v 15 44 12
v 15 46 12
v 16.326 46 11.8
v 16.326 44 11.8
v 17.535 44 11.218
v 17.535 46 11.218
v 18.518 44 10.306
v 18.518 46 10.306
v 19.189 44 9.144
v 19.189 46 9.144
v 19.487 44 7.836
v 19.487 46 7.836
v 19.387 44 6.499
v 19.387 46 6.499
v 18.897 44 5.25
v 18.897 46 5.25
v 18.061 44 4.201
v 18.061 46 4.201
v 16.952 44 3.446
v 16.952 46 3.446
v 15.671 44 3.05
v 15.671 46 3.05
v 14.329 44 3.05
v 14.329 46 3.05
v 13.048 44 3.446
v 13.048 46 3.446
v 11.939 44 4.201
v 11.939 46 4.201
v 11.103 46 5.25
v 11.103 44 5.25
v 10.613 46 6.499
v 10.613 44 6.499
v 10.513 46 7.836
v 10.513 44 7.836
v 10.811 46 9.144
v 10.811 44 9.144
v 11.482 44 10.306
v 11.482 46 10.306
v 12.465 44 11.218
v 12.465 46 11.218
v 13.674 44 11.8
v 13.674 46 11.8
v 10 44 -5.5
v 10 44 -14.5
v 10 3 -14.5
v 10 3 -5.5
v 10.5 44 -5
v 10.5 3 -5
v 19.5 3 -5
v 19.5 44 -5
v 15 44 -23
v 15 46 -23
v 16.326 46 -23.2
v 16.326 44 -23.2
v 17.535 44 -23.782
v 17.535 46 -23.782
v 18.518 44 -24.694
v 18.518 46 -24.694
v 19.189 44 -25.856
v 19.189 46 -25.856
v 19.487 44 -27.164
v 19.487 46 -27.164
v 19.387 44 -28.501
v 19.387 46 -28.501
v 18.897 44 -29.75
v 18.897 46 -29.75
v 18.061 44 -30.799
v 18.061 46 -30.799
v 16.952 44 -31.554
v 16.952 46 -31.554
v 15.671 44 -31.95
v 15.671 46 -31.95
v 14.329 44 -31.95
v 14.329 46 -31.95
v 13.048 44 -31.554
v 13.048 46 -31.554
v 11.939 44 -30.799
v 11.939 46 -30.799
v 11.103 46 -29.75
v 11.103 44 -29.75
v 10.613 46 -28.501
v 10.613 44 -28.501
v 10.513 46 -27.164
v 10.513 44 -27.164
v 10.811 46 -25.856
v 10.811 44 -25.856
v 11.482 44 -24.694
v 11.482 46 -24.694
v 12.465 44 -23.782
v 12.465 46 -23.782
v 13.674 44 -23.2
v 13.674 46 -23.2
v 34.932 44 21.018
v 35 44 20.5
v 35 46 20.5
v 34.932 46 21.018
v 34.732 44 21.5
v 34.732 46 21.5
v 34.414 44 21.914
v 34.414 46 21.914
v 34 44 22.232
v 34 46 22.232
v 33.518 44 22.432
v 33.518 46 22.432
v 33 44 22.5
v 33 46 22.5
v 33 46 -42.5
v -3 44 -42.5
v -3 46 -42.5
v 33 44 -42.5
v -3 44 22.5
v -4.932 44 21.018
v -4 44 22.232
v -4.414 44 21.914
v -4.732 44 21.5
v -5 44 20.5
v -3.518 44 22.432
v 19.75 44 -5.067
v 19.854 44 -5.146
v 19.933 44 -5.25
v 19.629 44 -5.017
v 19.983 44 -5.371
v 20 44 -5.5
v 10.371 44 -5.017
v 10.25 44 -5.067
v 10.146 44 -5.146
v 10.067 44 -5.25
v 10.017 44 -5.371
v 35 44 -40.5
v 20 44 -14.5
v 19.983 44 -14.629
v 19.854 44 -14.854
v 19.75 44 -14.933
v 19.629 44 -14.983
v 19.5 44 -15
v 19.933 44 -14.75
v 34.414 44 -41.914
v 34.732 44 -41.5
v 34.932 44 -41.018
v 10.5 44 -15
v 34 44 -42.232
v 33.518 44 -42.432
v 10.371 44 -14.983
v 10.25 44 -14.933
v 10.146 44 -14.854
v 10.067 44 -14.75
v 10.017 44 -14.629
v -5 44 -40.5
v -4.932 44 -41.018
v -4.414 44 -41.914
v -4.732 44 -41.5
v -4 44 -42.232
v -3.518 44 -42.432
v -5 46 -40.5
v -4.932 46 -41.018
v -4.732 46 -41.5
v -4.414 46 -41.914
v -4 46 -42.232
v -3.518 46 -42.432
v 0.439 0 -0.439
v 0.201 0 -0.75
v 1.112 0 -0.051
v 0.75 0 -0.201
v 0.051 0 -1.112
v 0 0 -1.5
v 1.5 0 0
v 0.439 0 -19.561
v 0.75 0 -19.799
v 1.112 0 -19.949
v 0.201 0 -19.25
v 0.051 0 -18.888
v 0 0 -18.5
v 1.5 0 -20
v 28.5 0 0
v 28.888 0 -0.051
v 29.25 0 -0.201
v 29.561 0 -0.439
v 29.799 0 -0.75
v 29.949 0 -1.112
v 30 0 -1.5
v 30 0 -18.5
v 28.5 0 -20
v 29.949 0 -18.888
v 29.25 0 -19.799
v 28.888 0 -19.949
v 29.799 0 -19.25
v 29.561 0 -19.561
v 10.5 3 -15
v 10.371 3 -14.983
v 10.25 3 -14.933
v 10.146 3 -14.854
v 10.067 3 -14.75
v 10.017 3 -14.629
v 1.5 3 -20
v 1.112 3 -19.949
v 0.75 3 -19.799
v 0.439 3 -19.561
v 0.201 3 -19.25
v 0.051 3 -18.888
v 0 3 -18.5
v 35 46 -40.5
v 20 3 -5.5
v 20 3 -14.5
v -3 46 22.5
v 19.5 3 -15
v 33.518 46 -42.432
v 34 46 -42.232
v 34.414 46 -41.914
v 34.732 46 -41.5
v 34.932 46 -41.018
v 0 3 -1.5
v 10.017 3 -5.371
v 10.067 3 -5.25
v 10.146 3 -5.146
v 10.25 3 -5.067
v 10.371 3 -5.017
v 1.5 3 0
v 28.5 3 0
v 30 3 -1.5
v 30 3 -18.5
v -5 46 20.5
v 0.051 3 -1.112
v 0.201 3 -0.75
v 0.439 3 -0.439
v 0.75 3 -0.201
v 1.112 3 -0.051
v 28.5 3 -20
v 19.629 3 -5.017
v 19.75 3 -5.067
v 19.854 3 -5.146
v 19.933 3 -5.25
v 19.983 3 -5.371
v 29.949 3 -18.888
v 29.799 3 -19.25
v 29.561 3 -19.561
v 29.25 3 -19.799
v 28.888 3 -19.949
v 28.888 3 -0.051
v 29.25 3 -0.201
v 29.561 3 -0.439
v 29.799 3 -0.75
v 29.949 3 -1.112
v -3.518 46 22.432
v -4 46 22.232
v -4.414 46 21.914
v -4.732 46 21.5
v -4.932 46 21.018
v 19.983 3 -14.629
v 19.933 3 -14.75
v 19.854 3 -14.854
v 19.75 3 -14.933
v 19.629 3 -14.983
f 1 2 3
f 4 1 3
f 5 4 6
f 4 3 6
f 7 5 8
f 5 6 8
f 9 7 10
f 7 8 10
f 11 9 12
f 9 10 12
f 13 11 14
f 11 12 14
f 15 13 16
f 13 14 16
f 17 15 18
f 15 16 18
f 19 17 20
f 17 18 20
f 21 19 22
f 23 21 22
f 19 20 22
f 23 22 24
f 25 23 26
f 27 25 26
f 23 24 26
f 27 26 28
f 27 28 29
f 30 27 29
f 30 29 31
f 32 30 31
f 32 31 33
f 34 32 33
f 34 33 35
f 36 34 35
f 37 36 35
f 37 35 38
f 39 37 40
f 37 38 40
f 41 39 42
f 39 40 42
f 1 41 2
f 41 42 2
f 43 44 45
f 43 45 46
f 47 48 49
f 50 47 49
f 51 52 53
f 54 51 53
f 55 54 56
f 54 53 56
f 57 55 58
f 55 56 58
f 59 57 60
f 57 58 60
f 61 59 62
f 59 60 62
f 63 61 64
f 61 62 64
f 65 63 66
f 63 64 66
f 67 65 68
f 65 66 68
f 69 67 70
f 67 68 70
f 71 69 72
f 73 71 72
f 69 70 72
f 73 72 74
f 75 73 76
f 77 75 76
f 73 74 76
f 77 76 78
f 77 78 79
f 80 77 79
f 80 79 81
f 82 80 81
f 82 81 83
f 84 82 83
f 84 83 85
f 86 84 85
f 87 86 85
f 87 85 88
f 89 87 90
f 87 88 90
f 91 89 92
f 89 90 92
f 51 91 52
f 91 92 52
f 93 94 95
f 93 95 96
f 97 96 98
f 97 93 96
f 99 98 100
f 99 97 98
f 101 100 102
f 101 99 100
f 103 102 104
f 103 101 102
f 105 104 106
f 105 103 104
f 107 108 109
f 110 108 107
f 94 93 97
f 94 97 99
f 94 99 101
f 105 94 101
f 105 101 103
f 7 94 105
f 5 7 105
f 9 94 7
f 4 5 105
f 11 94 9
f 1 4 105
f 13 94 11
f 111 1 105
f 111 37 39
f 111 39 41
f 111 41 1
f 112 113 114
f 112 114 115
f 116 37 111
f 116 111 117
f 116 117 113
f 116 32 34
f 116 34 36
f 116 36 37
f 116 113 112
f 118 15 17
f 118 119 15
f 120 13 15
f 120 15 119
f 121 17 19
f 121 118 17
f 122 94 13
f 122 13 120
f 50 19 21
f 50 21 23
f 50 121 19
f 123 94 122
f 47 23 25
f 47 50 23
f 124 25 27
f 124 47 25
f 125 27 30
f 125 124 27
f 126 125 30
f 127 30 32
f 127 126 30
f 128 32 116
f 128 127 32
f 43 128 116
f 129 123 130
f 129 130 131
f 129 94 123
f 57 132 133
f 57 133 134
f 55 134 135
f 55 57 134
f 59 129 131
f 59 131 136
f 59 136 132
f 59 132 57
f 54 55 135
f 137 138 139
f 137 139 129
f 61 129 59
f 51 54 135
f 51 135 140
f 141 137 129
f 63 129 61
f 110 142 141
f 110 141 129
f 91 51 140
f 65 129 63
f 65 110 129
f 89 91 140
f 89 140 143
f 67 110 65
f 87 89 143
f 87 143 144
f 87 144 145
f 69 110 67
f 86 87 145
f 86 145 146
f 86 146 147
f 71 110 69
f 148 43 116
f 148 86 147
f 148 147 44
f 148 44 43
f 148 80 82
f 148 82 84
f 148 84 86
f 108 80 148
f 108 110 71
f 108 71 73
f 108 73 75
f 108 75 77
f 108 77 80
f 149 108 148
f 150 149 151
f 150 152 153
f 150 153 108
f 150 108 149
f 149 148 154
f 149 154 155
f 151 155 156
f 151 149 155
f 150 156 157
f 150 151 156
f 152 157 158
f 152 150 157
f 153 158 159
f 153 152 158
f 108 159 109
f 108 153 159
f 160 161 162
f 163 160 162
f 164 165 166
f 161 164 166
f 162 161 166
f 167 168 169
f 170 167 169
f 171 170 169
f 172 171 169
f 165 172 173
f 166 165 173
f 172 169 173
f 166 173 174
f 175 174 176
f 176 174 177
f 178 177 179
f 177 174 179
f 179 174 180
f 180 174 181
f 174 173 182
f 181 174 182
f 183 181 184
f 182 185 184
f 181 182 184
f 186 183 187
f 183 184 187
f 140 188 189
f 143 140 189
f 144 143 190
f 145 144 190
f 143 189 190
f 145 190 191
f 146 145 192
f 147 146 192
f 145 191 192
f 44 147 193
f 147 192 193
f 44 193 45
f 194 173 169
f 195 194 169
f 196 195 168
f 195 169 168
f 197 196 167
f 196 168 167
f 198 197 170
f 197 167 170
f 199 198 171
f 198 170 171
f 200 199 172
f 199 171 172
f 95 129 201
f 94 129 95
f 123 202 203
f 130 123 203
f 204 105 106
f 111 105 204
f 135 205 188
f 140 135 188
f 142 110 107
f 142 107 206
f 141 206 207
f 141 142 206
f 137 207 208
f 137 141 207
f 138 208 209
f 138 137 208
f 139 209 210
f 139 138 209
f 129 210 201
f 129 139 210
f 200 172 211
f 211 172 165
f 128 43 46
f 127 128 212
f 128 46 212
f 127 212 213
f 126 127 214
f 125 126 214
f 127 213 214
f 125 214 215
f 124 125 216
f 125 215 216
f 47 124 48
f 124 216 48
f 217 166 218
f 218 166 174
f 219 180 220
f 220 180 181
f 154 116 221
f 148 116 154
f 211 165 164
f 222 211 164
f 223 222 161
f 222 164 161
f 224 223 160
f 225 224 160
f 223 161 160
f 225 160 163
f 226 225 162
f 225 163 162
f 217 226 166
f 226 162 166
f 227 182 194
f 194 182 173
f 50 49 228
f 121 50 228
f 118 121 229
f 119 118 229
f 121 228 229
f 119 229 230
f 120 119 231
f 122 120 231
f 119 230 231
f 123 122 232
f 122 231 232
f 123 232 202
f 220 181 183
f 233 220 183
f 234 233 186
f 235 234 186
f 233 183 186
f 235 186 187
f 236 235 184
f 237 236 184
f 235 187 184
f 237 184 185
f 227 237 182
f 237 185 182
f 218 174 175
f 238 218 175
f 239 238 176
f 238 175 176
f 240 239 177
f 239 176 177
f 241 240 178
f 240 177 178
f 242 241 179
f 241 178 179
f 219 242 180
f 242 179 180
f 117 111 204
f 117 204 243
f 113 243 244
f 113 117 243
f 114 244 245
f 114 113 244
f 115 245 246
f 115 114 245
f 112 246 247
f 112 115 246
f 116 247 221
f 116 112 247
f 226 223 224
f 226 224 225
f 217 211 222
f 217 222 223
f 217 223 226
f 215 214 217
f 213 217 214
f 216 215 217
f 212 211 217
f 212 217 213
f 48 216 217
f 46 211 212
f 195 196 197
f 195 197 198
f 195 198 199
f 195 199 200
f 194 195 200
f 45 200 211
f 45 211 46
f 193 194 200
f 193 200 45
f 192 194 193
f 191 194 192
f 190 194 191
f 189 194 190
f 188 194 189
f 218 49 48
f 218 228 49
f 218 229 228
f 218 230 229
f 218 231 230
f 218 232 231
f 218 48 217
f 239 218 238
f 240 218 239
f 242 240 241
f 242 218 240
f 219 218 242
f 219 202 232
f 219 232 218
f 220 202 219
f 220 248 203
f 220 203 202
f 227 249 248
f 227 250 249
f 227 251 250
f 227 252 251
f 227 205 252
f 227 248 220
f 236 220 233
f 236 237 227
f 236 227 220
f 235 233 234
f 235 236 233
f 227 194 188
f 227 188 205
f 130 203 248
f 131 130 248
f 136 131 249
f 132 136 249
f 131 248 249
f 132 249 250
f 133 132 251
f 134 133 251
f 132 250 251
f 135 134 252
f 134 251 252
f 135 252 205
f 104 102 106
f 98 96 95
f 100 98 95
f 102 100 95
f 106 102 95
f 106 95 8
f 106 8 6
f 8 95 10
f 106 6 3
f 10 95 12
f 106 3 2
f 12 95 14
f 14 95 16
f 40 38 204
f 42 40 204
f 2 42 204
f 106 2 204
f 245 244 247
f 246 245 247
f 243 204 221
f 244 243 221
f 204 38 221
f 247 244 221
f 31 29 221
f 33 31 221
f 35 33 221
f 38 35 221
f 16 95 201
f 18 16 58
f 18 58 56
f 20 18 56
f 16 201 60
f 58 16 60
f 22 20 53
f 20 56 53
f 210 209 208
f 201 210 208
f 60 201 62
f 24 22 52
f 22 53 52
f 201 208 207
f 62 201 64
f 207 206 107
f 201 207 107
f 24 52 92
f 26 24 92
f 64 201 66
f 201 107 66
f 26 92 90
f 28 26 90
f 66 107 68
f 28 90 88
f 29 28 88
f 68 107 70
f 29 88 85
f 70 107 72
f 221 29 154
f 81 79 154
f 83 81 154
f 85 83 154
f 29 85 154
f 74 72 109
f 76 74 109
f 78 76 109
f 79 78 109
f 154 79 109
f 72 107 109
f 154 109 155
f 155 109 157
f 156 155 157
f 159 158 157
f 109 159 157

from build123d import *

# Parameters (mm, degrees)
BOSS_EXTRUDE1_DEPTH = 3
BOSS_EXTRUDE2_DEPTH = 41
BOSS_EXTRUDE3_DEPTH = 2
SKETCH5_R           = 4.5
CUT_EXTRUDE1_DEPTH  = 2


with BuildPart() as part:
    # Sketch1 → Boss-Extrude1 (new body)
    with BuildSketch(Plane(origin=(0, 0, 0), x_dir=(1, 0, 0), z_dir=(0, 1, 0))):
        with BuildLine():
            Line((1.5, 0), (28.5, 0))
            ThreePointArc((28.5, 0), (29.560660172, 0.439339828), (30, 1.5))
            Line((30, 1.5), (30, 18.5))
            ThreePointArc((30, 18.5), (29.560660172, 19.560660172), (28.5, 20))
            Line((28.5, 20), (1.5, 20))
            ThreePointArc((1.5, 20), (0.439339828, 19.560660172), (0, 18.5))
            Line((0, 18.5), (0, 1.5))
            ThreePointArc((0, 1.5), (0.439339828, 0.439339828), (1.5, 0))
        make_face()
    extrude(amount=BOSS_EXTRUDE1_DEPTH)

    # Sketch3 → Boss-Extrude2 (add)
    with BuildSketch(Plane(origin=(0, 3, 0), x_dir=(1, 0, 0), z_dir=(0, 1, 0))):
        with BuildLine():
            Line((10.5, 5), (19.5, 5))
            ThreePointArc((19.5, 5), (19.853553391, 5.146446609), (20, 5.5))
            Line((20, 5.5), (20, 14.5))
            ThreePointArc((20, 14.5), (19.853553391, 14.853553391), (19.5, 15))
            Line((19.5, 15), (10.5, 15))
            ThreePointArc((10.5, 15), (10.146446609, 14.853553391), (10, 14.5))
            Line((10, 14.5), (10, 5.5))
            ThreePointArc((10, 5.5), (10.146446609, 5.146446609), (10.5, 5))
        make_face()
    extrude(amount=BOSS_EXTRUDE2_DEPTH)

    # Sketch4 → Boss-Extrude3 (add)
    with BuildSketch(Plane(origin=(0, 44, 0), x_dir=(1, 0, 0), z_dir=(0, 1, 0))):
        with BuildLine():
            Line((33, -22.5), (-3, -22.5))
            ThreePointArc((-3, -22.5), (-4.414213562, -21.914213562), (-5, -20.5))
            Line((-5, -20.5), (-5, 40.5))
            ThreePointArc((-5, 40.5), (-4.414213562, 41.914213562), (-3, 42.5))
            Line((-3, 42.5), (33, 42.5))
            ThreePointArc((33, 42.5), (34.414213562, 41.914213562), (35, 40.5))
            Line((35, 40.5), (35, -20.5))
            ThreePointArc((35, -20.5), (34.414213562, -21.914213562), (33, -22.5))
        make_face()
    extrude(amount=BOSS_EXTRUDE3_DEPTH)

    # Sketch5 → Cut-Extrude1 (cut)
    with BuildSketch(Plane(origin=(0, 46, 0), x_dir=(1, 0, 0), z_dir=(0, 1, 0))):
        with Locations(Location((15, 27.5, 0), (0, 0, 270))):
            Circle(SKETCH5_R)
        with Locations(Location((15, -7.5, 0), (0, 0, 270))):
            Circle(SKETCH5_R)
    extrude(amount=-CUT_EXTRUDE1_DEPTH, mode=Mode.SUBTRACT)


solid = part.part
